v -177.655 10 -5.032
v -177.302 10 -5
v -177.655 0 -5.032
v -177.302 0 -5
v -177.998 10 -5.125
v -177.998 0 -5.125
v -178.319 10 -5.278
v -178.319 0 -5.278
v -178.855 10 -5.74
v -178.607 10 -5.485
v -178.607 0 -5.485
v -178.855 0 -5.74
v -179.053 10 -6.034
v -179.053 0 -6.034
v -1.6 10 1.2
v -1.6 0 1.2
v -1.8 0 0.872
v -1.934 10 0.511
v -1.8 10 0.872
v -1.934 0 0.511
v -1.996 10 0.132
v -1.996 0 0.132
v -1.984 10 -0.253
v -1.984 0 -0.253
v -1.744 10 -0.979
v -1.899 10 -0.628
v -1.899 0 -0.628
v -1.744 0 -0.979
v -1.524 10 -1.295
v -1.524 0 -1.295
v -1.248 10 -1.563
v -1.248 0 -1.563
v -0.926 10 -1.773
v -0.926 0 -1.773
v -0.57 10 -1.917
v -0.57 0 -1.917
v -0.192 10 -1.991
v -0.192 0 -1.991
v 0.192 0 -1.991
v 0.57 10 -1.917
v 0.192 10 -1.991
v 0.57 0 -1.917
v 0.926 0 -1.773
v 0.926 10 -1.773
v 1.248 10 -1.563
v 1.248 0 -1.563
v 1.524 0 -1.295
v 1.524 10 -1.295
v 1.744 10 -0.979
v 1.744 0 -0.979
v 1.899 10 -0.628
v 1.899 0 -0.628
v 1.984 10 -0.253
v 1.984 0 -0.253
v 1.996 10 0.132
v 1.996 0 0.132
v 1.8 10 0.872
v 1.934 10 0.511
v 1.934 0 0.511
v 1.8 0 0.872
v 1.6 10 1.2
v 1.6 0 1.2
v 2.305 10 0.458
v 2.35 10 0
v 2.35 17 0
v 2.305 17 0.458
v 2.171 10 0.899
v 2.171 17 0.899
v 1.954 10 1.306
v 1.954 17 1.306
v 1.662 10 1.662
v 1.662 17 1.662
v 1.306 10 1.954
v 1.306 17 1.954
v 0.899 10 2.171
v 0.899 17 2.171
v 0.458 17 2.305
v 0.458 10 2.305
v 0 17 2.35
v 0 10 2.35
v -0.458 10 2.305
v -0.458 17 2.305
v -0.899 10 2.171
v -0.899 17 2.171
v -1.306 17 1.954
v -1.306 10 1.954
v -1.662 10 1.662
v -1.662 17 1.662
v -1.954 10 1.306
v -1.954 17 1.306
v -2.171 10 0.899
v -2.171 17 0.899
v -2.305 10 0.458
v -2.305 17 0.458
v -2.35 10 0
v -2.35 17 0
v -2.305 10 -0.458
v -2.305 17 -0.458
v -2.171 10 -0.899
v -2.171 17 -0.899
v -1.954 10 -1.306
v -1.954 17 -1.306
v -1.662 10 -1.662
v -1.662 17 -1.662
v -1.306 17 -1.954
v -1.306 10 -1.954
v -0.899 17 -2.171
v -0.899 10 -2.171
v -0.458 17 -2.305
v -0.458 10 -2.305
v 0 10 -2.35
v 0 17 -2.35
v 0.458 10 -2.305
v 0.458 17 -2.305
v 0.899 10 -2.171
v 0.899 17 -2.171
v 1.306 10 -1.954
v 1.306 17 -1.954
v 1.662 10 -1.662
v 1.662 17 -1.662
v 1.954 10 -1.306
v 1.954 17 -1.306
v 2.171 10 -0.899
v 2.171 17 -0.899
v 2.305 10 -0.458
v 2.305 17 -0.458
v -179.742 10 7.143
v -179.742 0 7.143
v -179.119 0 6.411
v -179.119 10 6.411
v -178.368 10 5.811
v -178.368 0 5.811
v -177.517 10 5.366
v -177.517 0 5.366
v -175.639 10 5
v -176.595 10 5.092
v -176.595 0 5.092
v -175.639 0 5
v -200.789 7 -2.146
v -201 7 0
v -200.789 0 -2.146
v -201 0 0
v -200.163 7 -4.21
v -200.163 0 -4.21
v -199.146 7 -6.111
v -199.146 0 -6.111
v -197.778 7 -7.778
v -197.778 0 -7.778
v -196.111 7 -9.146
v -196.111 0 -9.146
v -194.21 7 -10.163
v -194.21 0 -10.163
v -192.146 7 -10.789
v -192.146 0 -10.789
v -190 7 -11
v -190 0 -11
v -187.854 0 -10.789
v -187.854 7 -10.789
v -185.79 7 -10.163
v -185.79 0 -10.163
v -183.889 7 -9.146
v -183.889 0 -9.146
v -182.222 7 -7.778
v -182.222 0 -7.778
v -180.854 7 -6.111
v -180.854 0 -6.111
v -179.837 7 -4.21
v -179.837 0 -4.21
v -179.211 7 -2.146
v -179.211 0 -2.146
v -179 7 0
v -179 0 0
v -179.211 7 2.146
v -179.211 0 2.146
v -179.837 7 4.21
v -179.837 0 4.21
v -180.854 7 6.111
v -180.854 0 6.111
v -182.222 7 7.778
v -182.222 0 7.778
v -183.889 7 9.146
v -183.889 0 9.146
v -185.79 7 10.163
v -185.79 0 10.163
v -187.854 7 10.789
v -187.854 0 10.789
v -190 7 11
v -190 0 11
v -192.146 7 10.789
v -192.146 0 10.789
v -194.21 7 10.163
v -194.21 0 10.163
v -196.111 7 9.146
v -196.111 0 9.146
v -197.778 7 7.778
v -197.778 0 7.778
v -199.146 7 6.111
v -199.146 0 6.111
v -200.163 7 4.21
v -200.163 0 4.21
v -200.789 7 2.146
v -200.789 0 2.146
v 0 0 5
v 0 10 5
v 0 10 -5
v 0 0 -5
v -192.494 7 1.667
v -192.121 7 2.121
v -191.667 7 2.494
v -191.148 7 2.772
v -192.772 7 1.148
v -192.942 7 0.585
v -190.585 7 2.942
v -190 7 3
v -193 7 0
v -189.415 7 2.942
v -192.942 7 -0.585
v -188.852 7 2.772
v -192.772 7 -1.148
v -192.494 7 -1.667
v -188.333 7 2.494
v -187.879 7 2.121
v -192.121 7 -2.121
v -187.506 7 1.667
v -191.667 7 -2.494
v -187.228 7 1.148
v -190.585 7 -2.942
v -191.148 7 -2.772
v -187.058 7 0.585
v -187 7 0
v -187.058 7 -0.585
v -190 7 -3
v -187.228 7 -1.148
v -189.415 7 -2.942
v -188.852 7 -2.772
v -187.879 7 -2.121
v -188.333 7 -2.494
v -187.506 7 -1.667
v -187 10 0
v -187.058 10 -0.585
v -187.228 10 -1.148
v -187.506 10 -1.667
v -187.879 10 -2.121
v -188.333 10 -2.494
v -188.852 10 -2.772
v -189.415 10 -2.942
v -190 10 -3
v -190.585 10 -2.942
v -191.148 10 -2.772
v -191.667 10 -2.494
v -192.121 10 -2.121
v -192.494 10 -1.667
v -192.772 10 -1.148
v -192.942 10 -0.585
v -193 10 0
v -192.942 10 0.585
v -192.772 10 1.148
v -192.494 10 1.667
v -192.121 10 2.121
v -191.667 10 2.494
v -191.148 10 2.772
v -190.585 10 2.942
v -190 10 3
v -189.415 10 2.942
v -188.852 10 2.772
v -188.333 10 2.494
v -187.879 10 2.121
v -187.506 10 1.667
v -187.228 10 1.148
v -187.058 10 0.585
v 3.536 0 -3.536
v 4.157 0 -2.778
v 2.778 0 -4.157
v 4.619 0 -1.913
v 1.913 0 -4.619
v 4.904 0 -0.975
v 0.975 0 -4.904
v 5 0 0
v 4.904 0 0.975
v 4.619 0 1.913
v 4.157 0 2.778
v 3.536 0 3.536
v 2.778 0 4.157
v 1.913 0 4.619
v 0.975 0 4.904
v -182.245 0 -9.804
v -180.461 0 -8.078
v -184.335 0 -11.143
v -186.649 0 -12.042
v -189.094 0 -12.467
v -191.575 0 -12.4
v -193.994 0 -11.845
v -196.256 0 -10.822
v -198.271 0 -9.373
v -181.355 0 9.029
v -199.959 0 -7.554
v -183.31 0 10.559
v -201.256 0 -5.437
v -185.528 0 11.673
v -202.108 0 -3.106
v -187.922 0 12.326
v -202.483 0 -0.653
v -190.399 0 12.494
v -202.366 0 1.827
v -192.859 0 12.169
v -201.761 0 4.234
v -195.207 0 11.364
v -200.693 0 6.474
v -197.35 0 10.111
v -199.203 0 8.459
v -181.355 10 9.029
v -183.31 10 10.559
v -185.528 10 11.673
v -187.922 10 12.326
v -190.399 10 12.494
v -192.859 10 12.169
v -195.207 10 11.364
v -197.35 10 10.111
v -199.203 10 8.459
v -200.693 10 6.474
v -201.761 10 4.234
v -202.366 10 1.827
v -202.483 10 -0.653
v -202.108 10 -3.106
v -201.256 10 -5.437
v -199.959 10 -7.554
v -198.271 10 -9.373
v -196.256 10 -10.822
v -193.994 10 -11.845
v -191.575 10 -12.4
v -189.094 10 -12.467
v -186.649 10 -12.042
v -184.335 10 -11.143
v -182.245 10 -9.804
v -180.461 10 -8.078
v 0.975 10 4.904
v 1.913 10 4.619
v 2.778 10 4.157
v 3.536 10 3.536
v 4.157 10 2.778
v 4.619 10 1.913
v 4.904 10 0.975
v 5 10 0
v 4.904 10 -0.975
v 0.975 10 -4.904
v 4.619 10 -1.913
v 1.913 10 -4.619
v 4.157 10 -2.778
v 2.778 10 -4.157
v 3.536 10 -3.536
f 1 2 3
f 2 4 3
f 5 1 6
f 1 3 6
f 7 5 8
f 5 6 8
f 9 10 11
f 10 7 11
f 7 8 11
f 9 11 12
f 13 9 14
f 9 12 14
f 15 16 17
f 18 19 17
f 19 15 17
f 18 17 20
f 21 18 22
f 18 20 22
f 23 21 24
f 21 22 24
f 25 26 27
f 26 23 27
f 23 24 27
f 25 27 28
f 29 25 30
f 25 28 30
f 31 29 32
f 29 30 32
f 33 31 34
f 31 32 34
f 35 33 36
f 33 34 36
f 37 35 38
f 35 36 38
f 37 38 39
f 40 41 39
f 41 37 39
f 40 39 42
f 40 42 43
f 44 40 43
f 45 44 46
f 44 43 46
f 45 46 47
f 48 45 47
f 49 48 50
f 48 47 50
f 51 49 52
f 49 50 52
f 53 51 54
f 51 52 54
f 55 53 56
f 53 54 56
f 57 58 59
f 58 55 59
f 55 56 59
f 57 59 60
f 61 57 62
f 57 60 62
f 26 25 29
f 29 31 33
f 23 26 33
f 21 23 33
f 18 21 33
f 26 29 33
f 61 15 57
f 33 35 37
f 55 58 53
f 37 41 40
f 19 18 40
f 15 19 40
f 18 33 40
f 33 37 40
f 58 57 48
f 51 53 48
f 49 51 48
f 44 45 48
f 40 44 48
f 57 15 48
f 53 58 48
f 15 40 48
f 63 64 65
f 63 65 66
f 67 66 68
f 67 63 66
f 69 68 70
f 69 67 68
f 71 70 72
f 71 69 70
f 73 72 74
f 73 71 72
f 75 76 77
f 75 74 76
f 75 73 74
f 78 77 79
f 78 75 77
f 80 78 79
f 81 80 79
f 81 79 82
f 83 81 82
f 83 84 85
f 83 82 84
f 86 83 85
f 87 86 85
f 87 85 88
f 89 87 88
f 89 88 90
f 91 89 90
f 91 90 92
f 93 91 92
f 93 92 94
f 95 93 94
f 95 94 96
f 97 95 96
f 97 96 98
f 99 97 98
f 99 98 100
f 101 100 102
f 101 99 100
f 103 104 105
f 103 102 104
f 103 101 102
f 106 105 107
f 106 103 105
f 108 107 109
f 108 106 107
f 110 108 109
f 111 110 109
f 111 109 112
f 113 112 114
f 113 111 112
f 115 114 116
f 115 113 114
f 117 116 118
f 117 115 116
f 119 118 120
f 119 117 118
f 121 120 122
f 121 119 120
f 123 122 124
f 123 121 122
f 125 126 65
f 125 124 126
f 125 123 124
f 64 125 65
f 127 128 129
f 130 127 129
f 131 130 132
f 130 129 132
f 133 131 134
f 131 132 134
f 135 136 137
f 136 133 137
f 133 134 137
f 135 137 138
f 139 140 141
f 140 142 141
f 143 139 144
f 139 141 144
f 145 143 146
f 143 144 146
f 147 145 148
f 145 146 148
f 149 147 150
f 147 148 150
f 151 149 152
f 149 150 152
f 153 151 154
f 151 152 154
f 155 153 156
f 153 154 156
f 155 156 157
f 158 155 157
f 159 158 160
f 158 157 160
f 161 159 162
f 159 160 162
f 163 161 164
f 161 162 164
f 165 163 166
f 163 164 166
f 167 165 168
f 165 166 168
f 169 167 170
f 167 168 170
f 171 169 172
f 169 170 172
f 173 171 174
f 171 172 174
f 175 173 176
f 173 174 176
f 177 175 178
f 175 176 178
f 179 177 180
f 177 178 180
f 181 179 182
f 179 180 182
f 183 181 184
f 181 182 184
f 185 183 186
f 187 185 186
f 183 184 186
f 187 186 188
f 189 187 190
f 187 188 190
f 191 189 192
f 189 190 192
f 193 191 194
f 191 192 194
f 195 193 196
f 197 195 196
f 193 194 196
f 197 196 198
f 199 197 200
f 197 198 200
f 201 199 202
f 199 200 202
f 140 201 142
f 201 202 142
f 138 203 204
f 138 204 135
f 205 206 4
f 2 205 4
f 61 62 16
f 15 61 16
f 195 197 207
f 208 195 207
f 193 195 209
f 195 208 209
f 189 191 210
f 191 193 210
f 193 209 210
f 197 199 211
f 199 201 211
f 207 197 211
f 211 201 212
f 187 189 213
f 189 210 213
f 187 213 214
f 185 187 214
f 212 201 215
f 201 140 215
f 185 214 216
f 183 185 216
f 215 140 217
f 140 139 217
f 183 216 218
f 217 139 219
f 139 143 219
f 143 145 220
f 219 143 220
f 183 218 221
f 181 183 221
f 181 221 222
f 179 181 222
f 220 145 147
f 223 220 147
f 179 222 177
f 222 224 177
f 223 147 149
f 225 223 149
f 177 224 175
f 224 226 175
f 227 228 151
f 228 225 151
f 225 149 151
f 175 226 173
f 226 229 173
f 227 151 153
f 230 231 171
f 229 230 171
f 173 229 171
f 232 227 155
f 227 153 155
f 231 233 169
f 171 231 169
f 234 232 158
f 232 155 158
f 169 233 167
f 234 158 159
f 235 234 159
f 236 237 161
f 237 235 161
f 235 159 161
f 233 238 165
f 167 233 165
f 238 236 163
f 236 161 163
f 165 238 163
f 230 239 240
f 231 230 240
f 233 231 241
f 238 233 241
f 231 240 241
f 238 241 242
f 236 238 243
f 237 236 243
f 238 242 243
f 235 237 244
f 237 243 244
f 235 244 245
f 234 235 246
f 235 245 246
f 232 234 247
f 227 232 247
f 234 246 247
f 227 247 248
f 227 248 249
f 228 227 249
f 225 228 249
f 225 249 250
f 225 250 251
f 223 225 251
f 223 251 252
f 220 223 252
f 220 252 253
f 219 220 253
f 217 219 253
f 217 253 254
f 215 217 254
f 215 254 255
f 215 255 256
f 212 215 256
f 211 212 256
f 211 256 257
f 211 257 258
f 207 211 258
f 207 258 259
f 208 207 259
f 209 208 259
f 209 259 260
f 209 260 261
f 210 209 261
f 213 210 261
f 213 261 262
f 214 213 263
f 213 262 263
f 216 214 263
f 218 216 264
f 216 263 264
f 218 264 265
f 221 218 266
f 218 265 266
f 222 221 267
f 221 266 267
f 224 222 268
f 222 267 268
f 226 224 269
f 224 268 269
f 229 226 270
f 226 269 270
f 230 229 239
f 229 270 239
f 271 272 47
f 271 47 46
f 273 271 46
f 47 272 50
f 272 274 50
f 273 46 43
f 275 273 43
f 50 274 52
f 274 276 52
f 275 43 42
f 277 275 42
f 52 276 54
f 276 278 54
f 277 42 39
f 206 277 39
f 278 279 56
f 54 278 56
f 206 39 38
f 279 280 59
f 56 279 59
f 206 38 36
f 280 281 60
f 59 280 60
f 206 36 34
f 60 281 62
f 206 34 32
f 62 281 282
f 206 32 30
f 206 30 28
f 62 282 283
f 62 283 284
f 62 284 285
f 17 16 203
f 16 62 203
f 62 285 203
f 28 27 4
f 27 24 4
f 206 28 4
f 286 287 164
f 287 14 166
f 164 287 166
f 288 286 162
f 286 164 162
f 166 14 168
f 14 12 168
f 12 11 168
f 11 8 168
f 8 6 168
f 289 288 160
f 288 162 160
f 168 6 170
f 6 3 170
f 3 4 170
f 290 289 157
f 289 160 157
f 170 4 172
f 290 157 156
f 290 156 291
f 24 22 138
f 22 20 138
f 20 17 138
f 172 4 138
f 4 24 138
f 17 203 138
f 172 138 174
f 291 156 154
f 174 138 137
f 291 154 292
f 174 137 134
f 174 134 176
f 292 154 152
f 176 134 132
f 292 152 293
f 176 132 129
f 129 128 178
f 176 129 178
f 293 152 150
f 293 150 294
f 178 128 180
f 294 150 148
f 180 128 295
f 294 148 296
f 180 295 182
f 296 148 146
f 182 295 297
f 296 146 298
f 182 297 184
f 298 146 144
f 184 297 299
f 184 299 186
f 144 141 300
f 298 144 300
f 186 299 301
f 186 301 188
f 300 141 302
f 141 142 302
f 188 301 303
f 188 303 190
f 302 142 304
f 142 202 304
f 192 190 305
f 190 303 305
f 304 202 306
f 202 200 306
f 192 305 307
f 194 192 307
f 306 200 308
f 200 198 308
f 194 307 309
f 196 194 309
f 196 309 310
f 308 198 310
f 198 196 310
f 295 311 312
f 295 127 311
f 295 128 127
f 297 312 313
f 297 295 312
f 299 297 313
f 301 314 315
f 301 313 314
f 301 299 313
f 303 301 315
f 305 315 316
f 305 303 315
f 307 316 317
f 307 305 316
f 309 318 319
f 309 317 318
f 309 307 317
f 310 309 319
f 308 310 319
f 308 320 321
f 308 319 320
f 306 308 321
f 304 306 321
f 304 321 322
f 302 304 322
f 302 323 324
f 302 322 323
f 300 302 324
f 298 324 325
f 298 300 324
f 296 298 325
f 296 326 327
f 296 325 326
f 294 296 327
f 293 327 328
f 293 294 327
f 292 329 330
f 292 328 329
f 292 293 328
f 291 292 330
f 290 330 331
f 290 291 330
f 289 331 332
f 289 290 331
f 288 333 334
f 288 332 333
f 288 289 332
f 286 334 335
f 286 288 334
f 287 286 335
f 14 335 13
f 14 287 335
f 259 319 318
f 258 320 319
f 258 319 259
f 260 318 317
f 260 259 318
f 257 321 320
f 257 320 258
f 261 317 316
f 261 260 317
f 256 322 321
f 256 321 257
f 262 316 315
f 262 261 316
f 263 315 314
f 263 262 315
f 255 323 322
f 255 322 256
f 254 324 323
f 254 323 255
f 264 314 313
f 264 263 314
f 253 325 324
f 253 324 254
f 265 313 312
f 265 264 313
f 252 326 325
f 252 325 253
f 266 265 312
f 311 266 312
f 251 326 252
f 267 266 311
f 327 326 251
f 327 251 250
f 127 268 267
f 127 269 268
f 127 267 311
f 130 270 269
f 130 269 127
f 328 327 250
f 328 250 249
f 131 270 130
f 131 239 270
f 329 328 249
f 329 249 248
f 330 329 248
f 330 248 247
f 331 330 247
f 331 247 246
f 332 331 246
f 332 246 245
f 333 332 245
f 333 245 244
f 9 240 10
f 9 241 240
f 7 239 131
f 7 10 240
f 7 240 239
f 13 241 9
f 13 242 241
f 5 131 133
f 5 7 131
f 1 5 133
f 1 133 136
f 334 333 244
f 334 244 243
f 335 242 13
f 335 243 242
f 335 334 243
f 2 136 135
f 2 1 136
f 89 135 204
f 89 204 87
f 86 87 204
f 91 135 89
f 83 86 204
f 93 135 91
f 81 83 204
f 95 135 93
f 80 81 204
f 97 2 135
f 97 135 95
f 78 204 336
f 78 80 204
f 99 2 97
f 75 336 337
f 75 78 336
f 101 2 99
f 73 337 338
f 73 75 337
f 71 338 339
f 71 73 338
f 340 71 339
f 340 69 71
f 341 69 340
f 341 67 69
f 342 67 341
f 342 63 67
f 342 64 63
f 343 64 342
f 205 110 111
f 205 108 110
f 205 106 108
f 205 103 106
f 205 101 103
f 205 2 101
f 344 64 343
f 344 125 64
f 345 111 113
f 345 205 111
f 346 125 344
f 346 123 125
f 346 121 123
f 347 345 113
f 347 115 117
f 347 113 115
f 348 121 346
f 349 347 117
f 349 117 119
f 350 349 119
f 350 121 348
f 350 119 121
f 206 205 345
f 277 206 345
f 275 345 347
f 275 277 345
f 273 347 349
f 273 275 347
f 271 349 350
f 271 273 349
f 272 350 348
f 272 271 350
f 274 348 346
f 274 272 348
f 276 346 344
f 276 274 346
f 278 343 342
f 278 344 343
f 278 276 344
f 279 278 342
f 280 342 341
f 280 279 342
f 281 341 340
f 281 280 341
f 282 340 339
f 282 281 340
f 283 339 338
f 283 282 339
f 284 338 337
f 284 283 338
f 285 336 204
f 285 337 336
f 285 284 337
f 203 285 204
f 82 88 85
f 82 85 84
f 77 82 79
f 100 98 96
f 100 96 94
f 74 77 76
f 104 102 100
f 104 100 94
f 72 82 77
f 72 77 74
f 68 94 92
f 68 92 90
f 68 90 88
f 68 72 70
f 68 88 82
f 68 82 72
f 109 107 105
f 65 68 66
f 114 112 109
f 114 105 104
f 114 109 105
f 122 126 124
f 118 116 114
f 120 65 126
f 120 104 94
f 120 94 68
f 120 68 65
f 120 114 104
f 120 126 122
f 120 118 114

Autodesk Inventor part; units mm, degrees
ref_plane "YZ Plane" through (0, 0, 0) normal (1, 0, 0) x (0, 1, 0)
ref_plane "XZ Plane" through (0, 0, 0) normal (0, 1, 0) x (-1, 0, 0)
ref_plane "XY Plane" through (0, 0, 0) normal (0, 0, 1) x (1, 0, 0)
sketch "Sketch1" plane through (0, 0, 0) normal (0, 1, 0) x (-1, 0, 0)
  arc A0 (0, 5) -> (0, -5) centre (0, 0) ccw
  arc A1 (-1.6, 1.2) -> (1.6, 1.2) centre (0, 0) ccw
  line L0 (-1.6, 1.2) -> (1.6, 1.2)
  line L1 (95, 124.2688) -> (95, -104.3981) construction
  circle A2 centre (190, 0) radius 11
  arc A3 (179.0531, -6.0345) -> (179.7419, 7.1429) centre (190, 0) ccw
  line L2 (0, -5) -> (177.3016, -5)
  line L3 (0, 5) -> (175.6386, 5)
  arc A4 (179.0531, -6.0345) -> (177.3016, -5) centre (177.3016, -7) ccw
  arc A5 (175.6386, 5) -> (179.7419, 7.1429) centre (175.6386, 10) ccw
  point P0 (178.5436, -5)
  point P1 (178.5436, 5)
  dimension "d2" = 10
  dimension "d3" = 4
  dimension "d4" = 1.2
  dimension "d5" = 95
  dimension "d8" = 22
  dimension "d9" = 25
  dimension "d20" = 2
  dimension "d21" = 5
extrude "Extrusion2" add sketch "Sketch1" along normal blind 10
sketch "Sketch2" plane through (0, 10, 0) normal (0, 1, 0) x (1, 0, 0)
  circle A0 centre (0, 0) radius 2.35
  dimension "d12" = 4.7
extrude "Extrusion3" add sketch "Sketch2" along normal blind 7
sketch "Sketch3" plane through (0, 10, 0) normal (0, 1, 0) x (1, 0, 0)
  circle A0 centre (-190, 0) radius 11 construction
  line L0 (-179, 0) -> (-201, 0) construction
  circle A1 centre (-190, 0) radius 11
  circle A2 centre (-190, 0) radius 3
  point P0 (0, 0)
  dimension "d15" = 22
  dimension "d16" = 22
  dimension "d17" = 6
extrude "Extrusion4" add sketch "Sketch3" against normal blind 3
equation "\"d16\" = d15"
properties part number "eslabon1" material "Plástico ABS"
